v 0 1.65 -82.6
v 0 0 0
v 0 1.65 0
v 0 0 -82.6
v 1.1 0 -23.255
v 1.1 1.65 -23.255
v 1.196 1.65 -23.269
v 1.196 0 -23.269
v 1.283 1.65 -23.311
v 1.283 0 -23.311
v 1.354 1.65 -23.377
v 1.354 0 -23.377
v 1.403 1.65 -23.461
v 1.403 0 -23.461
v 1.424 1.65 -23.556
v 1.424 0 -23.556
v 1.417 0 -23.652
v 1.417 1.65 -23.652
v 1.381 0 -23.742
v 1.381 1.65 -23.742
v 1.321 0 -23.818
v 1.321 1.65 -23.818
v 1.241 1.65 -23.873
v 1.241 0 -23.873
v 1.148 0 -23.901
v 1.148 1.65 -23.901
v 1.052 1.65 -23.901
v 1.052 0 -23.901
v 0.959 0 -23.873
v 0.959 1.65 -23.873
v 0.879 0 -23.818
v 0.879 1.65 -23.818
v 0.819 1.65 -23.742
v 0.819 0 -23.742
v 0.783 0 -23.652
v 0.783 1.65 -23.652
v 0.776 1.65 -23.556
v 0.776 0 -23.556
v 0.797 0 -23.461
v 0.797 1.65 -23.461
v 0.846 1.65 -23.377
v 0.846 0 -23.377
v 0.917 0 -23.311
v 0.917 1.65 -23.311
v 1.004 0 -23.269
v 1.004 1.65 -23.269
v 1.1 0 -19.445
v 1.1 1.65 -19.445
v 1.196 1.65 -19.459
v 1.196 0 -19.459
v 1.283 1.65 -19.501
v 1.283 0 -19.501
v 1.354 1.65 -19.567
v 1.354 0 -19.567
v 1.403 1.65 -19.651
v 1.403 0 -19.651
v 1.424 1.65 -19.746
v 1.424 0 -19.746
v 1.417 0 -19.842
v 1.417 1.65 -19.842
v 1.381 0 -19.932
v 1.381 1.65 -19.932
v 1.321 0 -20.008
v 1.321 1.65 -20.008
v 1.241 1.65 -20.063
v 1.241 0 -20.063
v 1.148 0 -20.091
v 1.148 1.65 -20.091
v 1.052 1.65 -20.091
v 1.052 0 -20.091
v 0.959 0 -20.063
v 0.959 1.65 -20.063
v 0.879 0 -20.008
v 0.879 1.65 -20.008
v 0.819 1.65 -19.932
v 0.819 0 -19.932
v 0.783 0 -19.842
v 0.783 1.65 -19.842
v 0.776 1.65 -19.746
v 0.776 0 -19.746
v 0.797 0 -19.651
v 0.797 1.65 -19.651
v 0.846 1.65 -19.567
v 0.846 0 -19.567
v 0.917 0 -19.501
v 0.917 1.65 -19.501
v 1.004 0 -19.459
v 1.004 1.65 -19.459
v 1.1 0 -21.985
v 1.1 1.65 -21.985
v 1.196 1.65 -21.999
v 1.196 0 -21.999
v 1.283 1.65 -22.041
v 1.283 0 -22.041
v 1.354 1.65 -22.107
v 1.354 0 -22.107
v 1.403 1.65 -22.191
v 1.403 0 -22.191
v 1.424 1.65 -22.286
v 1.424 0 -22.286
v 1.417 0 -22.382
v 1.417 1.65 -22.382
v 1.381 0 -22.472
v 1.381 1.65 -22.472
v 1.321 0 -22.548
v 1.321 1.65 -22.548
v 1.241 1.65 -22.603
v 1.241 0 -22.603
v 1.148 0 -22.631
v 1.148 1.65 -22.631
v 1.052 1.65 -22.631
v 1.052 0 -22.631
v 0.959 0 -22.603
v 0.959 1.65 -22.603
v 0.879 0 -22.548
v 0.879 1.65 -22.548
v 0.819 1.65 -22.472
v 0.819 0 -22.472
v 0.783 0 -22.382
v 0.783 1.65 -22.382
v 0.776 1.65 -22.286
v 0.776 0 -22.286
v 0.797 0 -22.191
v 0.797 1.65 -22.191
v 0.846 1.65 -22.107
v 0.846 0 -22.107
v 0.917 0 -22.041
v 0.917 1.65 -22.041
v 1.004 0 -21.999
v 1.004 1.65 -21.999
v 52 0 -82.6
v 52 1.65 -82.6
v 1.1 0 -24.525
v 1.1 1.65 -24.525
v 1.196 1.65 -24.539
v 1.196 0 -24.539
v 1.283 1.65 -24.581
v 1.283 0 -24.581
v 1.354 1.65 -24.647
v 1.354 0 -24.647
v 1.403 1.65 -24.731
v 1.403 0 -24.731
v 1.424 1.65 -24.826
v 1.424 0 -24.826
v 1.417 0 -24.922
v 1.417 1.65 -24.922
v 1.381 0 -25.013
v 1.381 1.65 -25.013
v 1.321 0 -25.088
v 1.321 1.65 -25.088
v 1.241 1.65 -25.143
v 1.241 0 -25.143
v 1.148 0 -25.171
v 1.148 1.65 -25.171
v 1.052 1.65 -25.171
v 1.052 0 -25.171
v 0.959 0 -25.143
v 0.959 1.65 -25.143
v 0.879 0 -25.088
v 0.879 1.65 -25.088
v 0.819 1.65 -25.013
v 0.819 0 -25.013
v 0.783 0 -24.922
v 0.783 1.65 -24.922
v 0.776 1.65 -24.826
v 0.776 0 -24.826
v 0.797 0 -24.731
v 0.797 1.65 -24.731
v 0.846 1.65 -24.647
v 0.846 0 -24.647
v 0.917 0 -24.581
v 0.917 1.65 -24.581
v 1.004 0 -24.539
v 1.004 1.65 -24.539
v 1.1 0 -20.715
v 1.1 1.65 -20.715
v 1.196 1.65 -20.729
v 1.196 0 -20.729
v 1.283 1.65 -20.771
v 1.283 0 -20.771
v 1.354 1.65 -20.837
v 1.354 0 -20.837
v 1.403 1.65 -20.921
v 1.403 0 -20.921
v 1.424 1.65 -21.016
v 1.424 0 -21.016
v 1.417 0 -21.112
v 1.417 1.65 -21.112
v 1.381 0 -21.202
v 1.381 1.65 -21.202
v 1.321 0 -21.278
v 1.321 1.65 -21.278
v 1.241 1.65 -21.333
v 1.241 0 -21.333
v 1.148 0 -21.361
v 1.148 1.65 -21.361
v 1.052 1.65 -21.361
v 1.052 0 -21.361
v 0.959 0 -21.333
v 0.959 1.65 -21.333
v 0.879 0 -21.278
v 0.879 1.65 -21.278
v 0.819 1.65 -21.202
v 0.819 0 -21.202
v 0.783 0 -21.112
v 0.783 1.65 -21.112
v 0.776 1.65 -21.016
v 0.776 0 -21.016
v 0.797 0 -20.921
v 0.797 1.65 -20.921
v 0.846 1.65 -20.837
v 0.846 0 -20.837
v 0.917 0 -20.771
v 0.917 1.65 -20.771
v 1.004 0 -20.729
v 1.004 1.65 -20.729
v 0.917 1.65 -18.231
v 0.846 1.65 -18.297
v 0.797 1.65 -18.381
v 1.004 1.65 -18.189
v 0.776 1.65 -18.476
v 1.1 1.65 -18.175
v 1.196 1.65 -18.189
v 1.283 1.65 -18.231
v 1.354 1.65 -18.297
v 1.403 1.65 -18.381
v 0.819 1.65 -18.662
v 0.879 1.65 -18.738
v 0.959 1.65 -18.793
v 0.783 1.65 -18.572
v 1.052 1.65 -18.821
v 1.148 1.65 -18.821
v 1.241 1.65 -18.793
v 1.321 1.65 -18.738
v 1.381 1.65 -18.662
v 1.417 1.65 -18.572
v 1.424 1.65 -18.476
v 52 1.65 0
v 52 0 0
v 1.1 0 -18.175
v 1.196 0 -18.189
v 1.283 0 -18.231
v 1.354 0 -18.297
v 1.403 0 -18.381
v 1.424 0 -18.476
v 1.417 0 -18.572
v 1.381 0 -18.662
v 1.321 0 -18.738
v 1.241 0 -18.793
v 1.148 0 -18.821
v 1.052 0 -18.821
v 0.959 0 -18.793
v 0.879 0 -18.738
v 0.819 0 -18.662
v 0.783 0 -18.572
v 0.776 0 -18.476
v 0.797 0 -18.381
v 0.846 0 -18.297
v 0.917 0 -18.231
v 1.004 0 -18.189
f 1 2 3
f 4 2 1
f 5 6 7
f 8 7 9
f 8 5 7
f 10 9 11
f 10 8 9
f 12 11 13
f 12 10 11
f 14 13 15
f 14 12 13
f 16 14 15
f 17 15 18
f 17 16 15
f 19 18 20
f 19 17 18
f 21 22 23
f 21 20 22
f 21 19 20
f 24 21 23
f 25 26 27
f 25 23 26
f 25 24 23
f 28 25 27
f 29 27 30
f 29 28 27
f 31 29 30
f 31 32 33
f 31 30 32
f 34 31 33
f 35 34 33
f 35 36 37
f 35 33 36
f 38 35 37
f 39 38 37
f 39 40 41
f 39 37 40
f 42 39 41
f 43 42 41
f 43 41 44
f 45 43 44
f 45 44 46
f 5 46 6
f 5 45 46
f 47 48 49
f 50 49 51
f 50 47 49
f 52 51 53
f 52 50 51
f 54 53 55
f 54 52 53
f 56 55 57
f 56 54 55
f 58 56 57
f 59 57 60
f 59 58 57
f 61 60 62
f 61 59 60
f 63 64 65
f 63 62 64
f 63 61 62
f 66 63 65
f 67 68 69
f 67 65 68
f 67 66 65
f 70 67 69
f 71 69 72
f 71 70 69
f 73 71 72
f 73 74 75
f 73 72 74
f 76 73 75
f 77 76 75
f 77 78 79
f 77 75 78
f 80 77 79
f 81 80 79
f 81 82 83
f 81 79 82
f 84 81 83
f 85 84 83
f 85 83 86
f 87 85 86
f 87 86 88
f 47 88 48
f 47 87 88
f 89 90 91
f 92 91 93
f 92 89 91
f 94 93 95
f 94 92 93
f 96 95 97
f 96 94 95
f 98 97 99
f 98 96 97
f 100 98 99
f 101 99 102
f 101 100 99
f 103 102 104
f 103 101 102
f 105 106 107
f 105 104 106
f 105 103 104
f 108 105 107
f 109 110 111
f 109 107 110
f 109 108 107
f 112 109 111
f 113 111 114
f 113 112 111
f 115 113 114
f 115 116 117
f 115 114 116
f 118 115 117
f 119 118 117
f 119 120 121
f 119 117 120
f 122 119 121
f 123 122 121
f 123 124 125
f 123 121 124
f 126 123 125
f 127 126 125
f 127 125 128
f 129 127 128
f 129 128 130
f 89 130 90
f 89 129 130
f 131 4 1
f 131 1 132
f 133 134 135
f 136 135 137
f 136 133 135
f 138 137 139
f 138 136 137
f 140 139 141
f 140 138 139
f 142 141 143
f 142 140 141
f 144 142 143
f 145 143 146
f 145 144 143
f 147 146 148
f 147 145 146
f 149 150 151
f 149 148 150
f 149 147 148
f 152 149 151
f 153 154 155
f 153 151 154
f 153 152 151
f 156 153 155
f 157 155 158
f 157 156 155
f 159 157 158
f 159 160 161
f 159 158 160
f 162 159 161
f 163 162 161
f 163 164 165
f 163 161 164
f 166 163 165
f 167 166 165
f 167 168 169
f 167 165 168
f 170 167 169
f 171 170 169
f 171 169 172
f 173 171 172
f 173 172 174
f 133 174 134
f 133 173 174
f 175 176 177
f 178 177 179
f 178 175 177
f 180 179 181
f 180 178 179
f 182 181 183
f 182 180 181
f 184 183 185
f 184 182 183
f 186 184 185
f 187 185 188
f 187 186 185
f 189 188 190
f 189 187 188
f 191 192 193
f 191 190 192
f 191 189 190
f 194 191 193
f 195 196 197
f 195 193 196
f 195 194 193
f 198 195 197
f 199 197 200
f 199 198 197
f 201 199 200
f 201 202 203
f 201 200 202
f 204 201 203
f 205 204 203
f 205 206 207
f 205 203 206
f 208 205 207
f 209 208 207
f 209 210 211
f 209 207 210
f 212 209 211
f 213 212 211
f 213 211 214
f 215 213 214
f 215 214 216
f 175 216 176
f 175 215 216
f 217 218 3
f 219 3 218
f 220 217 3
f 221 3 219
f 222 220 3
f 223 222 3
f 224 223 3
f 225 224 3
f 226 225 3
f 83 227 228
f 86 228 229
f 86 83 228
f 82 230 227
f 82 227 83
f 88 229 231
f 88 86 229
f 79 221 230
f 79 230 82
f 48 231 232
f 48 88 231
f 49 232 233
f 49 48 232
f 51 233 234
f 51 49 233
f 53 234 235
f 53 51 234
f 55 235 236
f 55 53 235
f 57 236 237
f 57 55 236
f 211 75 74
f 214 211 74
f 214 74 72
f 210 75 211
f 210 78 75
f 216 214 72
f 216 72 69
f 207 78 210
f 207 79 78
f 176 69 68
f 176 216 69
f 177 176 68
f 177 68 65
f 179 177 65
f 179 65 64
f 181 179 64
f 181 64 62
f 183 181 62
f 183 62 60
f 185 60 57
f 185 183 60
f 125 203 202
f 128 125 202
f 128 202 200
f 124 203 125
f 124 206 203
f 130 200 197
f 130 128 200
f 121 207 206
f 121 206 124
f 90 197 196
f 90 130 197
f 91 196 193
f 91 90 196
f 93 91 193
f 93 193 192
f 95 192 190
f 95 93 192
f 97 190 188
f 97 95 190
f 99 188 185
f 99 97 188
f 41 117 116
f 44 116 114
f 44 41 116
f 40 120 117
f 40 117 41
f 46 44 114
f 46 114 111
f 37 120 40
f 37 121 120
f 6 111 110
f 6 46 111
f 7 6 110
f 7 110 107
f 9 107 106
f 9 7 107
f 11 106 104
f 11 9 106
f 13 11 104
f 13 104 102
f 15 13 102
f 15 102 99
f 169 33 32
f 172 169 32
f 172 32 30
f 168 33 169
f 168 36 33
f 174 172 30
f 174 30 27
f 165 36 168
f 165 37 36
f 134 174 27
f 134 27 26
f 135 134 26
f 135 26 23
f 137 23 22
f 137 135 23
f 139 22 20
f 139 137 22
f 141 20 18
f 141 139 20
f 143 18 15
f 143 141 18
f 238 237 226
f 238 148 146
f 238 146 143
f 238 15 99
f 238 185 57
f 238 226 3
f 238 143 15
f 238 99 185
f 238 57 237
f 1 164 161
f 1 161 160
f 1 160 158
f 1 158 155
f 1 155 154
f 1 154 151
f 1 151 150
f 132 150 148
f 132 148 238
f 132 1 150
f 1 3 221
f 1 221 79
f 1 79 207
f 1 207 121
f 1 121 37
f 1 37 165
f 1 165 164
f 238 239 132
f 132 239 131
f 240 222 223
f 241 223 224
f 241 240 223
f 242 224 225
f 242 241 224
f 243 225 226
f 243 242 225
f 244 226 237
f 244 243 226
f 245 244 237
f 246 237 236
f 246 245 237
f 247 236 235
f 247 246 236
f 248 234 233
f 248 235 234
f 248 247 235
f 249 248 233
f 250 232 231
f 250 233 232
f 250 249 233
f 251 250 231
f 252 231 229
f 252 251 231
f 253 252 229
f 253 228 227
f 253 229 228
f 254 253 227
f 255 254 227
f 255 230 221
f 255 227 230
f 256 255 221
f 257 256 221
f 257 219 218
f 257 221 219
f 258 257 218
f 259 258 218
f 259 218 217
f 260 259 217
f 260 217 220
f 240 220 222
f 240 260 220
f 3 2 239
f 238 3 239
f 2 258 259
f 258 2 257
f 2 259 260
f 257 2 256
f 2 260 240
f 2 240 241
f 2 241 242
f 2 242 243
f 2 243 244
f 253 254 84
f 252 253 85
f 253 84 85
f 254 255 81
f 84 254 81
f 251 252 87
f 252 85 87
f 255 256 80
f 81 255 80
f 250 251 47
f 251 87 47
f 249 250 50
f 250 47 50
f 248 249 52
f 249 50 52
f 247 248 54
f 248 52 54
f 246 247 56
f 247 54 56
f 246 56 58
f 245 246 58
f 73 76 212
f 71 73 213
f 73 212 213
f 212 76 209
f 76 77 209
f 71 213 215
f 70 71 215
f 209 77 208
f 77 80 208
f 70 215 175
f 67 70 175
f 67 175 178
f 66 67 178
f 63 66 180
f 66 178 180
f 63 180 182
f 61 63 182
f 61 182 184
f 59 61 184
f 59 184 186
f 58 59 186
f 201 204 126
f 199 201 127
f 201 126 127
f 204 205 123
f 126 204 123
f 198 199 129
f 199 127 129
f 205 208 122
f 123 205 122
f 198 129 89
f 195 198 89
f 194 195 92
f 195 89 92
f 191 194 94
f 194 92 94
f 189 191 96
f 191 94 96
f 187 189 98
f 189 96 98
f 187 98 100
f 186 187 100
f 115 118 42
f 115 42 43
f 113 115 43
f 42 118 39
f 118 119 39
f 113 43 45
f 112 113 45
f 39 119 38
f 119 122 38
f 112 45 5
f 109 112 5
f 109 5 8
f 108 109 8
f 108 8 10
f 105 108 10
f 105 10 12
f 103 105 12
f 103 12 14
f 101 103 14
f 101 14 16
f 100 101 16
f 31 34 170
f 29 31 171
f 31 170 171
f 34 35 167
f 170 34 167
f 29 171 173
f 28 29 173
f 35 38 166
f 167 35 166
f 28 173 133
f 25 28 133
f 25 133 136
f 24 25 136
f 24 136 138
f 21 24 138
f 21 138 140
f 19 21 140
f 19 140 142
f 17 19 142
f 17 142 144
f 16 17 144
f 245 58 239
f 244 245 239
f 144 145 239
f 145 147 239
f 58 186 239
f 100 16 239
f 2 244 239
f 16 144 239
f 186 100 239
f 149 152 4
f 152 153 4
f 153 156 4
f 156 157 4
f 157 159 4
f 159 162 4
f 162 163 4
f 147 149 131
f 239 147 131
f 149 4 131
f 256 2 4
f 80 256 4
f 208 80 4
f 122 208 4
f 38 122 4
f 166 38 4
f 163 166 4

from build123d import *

# Parameters (mm, degrees)
SKETCH1_W           = 52
SKETCH1_H           = 82.6
BOSS_EXTRUDE1_DEPTH = 1.65
SKETCH2_R           = 0.325
CUT_EXTRUDE4_DEPTH  = 98.619068322
LPATTERN1_COUNT     = 6
LPATTERN1_PITCH     = 1.27


with BuildPart() as part:
    # Sketch1 → Boss-Extrude1 (new body)
    with BuildSketch(Plane(origin=(0, 0, 0), x_dir=(1, 0, 0), z_dir=(0, 1, 0))):
        with Locations((26, 41.3)):
            Rectangle(SKETCH1_W, SKETCH1_H)
    extrude(amount=BOSS_EXTRUDE1_DEPTH)

    # Sketch2 → Cut-Extrude4 (cut, through all)
    with BuildSketch(Plane(origin=(0, 0, 0), x_dir=(1, 0, 0), z_dir=(0, 1, 0))):
        with Locations(Location((1.1, 18.5, 0), (0, 0, 270))):
            Circle(SKETCH2_R)
    cut_extrude4 = extrude(amount=CUT_EXTRUDE4_DEPTH, mode=Mode.SUBTRACT)

    # LPattern1: Cut-Extrude4 ×6
    with Locations(*[(0, 0, -i * LPATTERN1_PITCH) for i in range(1, LPATTERN1_COUNT)]):
        add(cut_extrude4, mode=Mode.SUBTRACT)


solid = part.part
